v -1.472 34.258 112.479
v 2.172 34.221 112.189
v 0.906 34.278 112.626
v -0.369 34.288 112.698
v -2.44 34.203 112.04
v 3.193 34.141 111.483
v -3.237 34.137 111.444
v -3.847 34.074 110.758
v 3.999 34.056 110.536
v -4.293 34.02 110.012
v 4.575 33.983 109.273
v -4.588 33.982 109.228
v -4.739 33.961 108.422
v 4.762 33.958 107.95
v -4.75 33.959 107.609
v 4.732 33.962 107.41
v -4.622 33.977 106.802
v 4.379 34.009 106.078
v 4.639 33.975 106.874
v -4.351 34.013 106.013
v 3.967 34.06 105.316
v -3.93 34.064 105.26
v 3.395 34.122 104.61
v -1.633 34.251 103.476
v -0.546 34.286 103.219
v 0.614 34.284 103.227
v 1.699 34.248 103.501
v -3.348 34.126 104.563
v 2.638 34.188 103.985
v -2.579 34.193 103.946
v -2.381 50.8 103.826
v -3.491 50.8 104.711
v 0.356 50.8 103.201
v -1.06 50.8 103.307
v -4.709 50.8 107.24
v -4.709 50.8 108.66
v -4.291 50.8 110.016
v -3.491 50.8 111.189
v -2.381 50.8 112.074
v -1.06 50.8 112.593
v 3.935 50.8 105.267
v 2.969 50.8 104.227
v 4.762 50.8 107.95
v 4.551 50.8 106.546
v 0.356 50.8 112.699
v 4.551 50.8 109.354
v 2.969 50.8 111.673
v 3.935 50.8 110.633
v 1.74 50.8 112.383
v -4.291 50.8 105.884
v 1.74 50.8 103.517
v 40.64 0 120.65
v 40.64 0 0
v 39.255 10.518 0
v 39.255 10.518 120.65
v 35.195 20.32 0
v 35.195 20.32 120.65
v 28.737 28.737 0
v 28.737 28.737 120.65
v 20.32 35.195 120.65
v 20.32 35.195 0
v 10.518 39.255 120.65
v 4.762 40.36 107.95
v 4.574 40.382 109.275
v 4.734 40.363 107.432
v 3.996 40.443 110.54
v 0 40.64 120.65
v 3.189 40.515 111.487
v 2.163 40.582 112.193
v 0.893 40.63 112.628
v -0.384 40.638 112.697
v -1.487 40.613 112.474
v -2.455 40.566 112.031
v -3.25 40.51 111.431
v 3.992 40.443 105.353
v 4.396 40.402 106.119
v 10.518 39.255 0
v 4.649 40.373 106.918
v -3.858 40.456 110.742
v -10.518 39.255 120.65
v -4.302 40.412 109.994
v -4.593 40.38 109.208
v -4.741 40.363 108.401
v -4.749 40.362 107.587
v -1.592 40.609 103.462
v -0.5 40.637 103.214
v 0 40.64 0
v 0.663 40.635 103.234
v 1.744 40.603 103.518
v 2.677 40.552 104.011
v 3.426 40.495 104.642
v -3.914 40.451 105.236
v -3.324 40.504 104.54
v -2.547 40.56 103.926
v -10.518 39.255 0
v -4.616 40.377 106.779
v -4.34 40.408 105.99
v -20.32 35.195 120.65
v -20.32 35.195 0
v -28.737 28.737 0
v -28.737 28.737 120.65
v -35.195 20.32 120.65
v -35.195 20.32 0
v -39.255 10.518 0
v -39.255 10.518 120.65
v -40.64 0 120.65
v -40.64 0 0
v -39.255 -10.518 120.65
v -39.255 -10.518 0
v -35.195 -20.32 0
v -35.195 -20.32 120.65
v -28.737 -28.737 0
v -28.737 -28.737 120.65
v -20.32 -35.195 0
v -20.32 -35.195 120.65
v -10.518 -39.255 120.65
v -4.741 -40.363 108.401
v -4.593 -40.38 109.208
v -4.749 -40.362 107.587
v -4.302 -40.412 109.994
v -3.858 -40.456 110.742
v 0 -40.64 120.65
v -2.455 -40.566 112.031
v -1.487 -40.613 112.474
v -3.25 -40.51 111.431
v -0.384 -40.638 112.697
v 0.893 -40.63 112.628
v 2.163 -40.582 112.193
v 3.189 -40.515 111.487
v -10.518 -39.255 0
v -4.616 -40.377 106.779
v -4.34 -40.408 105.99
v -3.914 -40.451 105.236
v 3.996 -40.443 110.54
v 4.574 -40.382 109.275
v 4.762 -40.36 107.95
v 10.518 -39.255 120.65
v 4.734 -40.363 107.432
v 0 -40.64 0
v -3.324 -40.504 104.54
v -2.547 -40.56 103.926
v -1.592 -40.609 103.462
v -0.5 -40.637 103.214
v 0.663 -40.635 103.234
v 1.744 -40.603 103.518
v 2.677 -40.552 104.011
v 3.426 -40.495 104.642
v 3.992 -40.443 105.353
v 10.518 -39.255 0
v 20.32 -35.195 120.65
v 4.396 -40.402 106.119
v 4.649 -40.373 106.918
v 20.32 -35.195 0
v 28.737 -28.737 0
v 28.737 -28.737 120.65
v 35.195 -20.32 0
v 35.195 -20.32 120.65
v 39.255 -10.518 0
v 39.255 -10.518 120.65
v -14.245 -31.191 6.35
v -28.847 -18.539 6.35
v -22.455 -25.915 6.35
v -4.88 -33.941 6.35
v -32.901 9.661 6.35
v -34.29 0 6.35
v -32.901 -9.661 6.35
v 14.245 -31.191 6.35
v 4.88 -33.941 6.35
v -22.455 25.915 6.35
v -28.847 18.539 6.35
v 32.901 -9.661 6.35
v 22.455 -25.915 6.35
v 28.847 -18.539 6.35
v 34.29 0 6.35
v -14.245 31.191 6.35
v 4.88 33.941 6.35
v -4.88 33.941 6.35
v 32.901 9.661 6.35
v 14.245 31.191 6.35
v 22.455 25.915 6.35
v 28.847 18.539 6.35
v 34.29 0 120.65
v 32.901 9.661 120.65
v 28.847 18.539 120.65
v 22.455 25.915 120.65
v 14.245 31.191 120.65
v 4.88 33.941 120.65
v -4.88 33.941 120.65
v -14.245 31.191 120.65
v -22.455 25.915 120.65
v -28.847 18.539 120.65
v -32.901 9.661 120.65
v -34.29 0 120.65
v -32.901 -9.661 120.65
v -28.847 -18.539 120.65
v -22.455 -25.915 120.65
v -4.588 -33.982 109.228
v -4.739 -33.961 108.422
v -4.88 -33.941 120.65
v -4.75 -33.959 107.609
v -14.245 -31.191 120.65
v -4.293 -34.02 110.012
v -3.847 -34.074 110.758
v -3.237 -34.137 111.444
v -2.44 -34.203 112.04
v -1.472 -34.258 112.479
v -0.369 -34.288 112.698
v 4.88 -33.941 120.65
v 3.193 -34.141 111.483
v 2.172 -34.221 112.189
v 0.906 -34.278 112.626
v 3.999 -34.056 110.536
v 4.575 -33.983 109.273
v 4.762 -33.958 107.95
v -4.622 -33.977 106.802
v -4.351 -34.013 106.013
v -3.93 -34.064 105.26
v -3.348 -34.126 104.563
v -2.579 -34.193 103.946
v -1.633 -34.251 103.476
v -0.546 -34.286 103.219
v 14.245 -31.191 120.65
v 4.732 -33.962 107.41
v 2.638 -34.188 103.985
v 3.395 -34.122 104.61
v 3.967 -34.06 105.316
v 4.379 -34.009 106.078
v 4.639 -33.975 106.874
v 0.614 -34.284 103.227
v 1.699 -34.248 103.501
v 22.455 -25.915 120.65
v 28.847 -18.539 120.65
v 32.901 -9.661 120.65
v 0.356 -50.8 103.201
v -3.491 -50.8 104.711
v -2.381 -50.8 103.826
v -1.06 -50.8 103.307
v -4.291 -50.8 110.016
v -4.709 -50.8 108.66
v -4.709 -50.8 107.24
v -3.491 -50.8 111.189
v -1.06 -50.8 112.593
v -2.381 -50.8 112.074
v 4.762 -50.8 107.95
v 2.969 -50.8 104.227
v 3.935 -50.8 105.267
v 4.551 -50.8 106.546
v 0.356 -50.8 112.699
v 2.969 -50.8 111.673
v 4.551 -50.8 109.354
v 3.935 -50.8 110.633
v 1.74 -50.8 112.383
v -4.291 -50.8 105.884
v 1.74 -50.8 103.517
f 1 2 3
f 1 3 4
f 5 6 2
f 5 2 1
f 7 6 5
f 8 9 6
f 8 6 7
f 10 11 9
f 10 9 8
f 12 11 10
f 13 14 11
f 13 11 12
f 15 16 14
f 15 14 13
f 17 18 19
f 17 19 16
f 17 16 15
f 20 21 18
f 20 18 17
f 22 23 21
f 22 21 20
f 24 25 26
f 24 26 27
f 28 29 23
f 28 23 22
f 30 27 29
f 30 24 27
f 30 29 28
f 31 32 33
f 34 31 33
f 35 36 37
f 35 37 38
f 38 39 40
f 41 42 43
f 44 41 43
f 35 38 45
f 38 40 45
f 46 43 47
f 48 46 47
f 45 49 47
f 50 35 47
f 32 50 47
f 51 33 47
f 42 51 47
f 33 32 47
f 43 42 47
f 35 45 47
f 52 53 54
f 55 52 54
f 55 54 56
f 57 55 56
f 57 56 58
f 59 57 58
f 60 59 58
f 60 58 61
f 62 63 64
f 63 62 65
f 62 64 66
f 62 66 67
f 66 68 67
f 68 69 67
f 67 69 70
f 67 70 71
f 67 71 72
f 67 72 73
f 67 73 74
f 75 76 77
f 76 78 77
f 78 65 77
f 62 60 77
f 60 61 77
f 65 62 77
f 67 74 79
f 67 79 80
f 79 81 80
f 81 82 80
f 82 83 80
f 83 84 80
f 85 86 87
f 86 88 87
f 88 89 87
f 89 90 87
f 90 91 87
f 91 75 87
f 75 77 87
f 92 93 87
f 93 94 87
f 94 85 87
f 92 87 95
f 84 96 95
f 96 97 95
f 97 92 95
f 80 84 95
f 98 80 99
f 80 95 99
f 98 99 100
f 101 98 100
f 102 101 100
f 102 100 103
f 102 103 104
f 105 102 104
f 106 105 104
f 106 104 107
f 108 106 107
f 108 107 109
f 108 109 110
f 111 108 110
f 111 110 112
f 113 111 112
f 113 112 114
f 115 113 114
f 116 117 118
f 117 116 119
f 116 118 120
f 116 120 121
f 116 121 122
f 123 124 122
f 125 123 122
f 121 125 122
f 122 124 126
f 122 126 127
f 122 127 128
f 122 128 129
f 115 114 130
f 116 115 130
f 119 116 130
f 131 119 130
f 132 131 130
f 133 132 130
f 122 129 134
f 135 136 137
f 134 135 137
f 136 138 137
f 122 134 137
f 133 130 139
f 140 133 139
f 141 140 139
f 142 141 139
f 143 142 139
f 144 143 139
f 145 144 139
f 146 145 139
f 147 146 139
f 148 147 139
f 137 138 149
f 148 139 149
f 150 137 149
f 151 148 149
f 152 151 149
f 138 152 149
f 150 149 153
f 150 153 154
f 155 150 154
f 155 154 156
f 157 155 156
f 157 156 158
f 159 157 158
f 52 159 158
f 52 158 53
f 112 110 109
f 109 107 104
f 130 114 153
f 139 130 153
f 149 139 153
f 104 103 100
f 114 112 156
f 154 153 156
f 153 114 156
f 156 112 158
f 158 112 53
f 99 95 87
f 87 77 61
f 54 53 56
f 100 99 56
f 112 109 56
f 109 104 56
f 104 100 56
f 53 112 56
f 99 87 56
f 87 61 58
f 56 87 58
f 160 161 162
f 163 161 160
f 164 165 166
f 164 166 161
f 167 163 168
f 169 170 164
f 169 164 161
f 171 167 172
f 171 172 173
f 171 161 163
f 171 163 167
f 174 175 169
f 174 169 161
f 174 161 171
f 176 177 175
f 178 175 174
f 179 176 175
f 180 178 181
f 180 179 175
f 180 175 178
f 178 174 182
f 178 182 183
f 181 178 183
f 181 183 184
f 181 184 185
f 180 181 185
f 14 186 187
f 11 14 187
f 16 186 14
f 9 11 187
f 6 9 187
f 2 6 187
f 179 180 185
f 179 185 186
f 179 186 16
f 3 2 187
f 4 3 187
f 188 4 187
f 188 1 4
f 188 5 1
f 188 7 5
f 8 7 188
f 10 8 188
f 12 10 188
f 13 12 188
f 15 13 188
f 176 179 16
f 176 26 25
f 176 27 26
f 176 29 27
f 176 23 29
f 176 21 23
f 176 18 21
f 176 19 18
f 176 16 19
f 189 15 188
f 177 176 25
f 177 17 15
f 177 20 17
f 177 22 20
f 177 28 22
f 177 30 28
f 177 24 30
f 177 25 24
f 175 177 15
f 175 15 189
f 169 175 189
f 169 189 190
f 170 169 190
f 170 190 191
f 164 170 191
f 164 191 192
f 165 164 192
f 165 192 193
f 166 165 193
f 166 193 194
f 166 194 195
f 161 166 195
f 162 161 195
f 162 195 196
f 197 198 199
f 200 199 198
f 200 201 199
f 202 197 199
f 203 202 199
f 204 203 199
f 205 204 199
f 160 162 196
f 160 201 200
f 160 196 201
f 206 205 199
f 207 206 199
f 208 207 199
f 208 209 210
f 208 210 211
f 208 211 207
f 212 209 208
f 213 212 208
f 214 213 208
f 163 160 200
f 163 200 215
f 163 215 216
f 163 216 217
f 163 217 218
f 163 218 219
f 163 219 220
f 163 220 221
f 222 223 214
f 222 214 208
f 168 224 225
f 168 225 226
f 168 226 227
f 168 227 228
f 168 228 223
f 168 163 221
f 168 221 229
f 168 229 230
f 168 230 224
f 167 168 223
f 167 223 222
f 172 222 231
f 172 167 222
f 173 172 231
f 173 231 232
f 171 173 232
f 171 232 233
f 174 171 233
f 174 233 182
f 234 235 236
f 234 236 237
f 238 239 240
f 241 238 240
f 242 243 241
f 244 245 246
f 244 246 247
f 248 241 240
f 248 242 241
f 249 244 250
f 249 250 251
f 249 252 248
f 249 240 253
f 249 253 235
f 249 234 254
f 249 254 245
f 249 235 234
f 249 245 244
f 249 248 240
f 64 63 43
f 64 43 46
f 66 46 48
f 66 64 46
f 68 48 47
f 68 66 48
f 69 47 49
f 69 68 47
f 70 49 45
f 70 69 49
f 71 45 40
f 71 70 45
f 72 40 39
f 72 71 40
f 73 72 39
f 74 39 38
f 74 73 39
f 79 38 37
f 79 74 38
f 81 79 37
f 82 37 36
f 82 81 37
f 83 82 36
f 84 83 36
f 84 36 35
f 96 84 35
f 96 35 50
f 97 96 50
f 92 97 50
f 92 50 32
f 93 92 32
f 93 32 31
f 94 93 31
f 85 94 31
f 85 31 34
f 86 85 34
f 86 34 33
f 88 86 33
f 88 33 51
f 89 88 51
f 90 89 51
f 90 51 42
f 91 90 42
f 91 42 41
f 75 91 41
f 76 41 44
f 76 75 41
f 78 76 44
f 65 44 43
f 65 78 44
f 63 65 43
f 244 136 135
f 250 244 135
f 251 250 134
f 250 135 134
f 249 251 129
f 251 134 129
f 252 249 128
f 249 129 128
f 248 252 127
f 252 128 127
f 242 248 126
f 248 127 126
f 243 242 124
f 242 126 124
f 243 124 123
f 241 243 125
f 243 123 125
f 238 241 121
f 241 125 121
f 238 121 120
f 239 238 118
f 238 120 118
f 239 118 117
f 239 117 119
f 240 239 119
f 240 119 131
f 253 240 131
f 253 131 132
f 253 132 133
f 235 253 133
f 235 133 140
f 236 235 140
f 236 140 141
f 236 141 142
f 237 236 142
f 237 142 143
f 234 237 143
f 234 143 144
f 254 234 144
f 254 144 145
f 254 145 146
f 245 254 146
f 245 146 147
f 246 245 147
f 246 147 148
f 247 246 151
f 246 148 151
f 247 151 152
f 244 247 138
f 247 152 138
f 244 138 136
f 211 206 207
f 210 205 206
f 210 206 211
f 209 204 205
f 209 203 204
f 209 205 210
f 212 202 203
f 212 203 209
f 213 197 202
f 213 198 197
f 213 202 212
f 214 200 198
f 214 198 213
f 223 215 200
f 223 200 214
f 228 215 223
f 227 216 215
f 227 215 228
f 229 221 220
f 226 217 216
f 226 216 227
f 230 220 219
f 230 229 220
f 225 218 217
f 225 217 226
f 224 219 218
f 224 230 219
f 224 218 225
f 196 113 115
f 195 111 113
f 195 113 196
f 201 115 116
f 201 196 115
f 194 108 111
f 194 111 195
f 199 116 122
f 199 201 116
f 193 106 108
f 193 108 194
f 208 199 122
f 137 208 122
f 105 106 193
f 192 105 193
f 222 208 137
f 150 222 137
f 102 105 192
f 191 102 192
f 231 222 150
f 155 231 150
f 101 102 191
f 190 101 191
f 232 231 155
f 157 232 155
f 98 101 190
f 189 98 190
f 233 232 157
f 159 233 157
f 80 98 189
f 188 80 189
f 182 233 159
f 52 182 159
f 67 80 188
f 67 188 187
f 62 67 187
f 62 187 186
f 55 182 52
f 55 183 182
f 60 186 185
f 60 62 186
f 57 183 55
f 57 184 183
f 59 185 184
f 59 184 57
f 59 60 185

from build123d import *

# Parameters (mm, degrees)
F0_R          = 40.64
F0_R_2        = 34.29
F1_DEPTH      = 120.65
F2_DEPTH      = 6.35
F3_R          = 4.7625
F4_DEPTH      = 50.8
F4_DEPTH_BACK = 50.8
F2_FACE_R     = 34.29
F5_DEPTH      = 114.301


with BuildPart() as f1:
    # F0 (on Top) → F1 (new body)
    with BuildSketch(Plane.XY):
        Circle(F0_R)
        Circle(F0_R_2, mode=Mode.SUBTRACT)
    extrude(amount=F1_DEPTH)

    # F0 (on Top) → F2 (join)
    with BuildSketch(Plane.XY):
        Circle(F0_R_2)
    extrude(amount=F2_DEPTH)

    # F3 (on Front) → F4 (join, two sides)
    with BuildSketch(Plane.XZ) as f4_sk:
        with Locations((0, 107.95)):
            Circle(F3_R)
    extrude(amount=F4_DEPTH)
    extrude(f4_sk.sketch, amount=-F4_DEPTH_BACK)

    # F2_face (on face) → F5 (cut, through all)
    with BuildSketch(Plane.XY.offset(6.35)):
        Circle(F2_FACE_R)
    extrude(amount=F5_DEPTH, mode=Mode.SUBTRACT)


solid = f1.part
